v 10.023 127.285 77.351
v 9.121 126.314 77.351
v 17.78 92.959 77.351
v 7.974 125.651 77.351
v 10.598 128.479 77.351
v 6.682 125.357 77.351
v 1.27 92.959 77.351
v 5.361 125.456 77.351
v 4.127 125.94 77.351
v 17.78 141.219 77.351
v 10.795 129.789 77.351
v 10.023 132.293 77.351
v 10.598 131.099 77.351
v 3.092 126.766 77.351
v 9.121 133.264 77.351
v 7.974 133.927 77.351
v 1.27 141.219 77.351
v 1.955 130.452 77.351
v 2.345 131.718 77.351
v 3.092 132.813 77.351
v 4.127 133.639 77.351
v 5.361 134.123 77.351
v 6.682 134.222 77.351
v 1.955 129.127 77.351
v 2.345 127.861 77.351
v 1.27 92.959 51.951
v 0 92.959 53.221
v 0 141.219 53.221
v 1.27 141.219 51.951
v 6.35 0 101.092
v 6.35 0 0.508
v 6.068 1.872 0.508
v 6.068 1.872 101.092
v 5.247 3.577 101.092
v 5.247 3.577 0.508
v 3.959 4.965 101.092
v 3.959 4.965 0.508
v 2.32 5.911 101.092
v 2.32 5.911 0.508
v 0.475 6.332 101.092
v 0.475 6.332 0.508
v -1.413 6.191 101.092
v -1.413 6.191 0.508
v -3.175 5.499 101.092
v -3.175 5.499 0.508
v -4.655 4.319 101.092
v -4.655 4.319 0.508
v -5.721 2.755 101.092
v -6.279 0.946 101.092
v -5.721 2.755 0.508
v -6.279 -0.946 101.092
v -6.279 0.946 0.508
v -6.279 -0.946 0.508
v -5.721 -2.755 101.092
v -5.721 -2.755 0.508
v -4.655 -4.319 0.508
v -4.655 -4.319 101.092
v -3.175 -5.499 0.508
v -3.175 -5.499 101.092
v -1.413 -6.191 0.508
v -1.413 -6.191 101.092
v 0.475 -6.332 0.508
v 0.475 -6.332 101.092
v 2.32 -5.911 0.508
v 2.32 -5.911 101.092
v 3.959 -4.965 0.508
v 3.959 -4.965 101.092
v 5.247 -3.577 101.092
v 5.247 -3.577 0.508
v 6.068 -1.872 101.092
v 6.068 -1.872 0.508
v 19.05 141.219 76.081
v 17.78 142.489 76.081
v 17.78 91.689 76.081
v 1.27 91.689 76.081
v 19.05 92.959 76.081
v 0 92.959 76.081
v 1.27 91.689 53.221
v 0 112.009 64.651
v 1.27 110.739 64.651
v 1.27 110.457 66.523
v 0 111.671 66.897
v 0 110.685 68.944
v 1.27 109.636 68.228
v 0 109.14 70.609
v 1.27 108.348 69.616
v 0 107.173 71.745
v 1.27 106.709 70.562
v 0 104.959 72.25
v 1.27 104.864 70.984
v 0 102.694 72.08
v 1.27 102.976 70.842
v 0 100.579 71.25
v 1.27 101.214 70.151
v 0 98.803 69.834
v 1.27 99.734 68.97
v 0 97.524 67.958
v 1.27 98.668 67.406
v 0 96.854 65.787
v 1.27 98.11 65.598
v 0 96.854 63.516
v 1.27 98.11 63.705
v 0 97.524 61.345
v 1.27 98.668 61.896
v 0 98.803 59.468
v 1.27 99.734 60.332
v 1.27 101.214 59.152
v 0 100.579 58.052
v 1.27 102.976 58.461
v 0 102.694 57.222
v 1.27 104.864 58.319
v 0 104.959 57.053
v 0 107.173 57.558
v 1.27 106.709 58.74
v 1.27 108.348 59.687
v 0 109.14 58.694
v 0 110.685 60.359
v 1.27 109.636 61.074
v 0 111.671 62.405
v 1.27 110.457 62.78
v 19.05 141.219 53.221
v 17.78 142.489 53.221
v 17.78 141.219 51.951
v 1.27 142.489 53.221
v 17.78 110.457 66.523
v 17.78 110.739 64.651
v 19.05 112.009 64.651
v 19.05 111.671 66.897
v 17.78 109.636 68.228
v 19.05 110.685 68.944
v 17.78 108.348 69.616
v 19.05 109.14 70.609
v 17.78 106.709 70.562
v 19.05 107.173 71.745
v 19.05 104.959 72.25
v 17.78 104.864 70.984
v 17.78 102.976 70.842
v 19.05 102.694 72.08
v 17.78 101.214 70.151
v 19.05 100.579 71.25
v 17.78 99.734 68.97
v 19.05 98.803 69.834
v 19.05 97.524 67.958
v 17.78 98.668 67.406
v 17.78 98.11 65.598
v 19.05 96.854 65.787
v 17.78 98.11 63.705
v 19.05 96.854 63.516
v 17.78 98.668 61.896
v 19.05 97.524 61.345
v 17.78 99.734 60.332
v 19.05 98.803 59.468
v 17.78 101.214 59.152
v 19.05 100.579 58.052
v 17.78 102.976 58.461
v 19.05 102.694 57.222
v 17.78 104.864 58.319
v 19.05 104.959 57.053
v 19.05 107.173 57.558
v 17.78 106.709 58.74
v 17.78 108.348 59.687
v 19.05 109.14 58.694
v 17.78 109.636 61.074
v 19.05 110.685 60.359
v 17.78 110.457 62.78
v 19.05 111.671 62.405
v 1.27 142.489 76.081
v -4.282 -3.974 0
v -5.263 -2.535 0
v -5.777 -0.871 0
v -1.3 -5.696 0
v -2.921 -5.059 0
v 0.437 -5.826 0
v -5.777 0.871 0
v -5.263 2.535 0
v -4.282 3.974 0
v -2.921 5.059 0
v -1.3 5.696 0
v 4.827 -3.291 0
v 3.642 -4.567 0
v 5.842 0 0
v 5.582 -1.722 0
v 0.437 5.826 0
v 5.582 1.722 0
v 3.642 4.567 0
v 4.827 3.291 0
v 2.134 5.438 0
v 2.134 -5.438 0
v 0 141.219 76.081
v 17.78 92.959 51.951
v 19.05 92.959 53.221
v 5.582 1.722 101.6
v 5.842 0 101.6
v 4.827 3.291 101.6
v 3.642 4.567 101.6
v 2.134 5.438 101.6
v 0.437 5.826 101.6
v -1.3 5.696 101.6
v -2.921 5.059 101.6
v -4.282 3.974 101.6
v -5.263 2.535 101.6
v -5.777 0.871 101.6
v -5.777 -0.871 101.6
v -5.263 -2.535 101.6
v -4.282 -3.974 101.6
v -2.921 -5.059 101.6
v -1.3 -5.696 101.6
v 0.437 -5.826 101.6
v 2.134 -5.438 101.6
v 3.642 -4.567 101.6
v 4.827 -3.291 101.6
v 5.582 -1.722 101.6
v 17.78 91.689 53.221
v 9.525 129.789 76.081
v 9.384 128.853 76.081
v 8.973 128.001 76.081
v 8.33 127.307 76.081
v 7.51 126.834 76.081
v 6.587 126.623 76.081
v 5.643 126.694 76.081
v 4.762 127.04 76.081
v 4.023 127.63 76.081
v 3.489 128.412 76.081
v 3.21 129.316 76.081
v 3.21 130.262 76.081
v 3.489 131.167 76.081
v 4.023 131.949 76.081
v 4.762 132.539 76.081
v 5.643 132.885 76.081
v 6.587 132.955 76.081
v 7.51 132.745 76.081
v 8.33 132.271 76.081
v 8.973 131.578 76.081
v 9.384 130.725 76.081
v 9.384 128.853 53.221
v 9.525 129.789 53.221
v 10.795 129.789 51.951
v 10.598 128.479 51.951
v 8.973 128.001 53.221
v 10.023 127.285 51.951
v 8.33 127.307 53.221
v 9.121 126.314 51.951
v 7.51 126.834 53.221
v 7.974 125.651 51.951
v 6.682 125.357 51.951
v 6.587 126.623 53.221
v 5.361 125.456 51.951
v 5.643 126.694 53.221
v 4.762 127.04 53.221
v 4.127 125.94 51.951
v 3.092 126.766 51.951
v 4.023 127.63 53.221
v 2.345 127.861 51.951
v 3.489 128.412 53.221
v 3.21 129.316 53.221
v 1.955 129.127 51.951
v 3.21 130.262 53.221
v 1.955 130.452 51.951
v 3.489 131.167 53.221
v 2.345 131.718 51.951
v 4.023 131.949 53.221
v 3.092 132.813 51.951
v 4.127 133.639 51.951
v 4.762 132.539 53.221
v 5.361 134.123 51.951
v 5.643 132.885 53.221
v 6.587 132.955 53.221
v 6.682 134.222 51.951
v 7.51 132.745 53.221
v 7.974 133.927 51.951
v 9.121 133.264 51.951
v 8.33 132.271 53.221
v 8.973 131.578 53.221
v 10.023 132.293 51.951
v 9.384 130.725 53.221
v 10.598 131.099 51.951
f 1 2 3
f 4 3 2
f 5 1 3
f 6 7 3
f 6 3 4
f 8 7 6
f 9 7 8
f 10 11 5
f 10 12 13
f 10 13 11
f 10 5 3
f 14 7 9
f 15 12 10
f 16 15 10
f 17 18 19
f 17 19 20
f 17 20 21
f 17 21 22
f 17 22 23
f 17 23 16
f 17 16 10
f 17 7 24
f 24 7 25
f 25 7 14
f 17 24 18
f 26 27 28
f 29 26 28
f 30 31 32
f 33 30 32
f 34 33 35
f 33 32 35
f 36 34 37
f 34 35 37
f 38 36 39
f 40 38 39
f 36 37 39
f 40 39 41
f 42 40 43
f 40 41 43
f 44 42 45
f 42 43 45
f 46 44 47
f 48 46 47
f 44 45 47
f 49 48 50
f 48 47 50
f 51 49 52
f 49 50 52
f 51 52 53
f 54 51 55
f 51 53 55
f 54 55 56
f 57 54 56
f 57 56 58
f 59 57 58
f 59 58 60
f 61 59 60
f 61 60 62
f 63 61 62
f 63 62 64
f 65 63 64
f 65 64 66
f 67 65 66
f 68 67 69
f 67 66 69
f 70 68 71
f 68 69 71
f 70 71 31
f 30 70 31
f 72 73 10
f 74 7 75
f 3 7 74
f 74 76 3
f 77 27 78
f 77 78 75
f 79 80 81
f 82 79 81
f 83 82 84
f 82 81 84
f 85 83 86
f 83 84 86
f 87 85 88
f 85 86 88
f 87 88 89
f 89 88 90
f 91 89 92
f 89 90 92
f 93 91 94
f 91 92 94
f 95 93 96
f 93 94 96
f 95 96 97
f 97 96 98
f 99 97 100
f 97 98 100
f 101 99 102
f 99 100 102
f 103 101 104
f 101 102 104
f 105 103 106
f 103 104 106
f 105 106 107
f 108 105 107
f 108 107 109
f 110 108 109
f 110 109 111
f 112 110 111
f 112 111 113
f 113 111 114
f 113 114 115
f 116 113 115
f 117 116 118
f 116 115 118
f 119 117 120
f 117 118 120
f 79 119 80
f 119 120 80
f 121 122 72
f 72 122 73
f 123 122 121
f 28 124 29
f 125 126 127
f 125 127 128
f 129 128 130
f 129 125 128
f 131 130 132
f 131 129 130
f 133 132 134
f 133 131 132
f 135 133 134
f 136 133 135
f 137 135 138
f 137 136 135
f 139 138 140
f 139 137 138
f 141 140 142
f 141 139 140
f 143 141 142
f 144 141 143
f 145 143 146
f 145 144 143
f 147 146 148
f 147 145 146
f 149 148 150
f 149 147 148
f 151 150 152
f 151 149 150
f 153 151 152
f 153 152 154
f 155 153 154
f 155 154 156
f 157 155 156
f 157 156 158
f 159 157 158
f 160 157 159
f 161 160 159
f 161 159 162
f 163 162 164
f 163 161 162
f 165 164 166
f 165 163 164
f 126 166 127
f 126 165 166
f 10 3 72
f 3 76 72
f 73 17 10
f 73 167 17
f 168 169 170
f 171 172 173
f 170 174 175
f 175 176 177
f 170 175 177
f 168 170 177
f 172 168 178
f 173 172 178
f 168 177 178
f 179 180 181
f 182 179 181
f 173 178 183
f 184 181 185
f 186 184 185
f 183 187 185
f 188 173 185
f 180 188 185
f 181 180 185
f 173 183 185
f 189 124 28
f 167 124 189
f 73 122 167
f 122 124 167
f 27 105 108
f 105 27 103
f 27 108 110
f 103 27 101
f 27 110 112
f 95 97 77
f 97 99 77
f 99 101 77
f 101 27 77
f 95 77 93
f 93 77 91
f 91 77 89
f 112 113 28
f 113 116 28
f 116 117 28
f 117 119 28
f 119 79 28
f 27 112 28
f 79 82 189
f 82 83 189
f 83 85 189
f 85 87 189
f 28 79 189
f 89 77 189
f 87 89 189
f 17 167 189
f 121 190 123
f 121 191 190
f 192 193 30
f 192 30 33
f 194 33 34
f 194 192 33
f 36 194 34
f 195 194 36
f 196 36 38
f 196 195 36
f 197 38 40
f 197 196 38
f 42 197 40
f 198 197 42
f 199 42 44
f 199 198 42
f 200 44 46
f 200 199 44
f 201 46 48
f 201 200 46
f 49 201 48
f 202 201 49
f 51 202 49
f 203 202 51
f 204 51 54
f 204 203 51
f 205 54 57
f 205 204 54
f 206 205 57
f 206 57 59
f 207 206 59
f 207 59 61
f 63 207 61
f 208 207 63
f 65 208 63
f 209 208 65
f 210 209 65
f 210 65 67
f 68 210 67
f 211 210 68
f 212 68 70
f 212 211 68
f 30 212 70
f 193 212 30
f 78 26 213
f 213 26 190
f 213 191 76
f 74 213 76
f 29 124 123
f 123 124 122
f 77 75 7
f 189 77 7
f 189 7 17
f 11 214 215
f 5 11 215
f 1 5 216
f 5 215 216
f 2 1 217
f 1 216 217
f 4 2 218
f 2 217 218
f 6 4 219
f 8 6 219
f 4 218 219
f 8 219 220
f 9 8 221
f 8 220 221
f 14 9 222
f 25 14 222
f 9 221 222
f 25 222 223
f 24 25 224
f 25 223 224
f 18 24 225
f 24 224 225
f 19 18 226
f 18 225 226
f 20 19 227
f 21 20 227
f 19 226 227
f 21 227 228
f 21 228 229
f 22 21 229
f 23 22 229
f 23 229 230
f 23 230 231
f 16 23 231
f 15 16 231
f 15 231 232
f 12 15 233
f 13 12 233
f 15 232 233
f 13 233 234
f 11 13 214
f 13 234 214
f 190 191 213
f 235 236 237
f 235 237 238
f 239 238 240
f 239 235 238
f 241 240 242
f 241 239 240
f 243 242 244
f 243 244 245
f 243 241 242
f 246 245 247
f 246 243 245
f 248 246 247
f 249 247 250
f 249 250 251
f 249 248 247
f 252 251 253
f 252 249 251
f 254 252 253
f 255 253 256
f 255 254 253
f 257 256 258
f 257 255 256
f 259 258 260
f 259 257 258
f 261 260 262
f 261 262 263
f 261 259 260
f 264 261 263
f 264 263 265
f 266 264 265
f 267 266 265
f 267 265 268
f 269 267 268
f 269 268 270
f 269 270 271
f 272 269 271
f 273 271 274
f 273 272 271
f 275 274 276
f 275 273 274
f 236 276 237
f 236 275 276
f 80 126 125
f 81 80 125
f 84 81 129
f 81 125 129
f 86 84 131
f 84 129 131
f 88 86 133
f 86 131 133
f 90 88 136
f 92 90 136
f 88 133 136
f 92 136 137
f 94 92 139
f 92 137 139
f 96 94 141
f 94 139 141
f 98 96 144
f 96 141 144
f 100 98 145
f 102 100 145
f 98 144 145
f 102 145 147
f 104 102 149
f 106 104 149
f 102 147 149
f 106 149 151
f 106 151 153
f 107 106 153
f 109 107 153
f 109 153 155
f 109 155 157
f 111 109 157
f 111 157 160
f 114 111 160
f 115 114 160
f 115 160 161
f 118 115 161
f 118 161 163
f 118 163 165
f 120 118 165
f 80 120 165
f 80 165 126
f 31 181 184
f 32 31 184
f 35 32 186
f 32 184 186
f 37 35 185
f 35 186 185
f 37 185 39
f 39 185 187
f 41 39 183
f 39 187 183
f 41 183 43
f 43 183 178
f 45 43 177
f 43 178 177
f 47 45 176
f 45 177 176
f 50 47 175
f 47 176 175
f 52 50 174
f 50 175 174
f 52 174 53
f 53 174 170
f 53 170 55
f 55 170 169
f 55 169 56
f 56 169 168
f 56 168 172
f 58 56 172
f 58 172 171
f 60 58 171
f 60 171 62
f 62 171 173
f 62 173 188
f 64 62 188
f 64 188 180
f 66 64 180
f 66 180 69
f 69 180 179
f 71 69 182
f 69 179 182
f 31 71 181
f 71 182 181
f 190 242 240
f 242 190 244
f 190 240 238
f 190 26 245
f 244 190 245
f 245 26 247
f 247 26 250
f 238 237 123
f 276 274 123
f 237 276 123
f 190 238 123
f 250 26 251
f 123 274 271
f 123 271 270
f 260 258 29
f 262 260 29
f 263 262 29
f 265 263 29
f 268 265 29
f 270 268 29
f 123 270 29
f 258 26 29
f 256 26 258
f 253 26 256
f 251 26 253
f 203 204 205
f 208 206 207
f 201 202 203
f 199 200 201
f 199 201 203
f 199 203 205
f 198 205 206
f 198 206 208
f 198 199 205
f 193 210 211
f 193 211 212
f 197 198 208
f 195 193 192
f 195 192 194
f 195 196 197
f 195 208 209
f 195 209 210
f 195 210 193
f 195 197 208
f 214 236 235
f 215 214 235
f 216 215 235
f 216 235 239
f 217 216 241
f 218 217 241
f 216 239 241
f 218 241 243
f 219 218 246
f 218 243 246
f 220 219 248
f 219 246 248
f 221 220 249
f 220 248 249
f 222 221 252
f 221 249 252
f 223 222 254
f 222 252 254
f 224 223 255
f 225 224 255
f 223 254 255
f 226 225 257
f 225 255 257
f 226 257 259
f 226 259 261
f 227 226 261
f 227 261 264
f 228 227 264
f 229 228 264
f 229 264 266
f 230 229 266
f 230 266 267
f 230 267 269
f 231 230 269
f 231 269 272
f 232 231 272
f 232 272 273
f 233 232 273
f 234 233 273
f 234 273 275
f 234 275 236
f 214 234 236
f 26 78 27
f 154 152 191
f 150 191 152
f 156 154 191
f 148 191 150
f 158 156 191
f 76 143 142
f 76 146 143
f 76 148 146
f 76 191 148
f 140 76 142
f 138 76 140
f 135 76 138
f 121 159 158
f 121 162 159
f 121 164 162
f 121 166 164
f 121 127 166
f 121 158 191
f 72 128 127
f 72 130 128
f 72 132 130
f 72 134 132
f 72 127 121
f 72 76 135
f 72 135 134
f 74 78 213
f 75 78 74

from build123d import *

# Parameters (mm, degrees)
F0_R     = 6.35
F1_DEPTH = 101.6
F2_SIZE  = 0.508
F3_W     = 50.8
F3_H     = 25.4
F4_DEPTH = 19.05
F5_R     = 6.35
F6_DEPTH = 25.4
F7_SIZE  = 1.27
F8_R     = 3.175
F9_DEPTH = 38.1
F10_SIZE = 1.27


with BuildPart() as f1:
    # F0 (on Top) → F1 (new body)
    with BuildSketch(Plane.XY):
        Circle(F0_R)
    extrude(amount=F1_DEPTH)

    # F2
    f2_edges = [f1.edges().sort_by_distance(p)[0] for p in [
        (-6.35, 0, 101.6),
        (-6.35, 0, 0),
    ]]
    chamfer(f2_edges, length=F2_SIZE)


with BuildPart() as f4:
    # F3 (on Right) → F4 (new body)
    with BuildSketch(Plane.YZ):
        with Locations((117.089135, 64.651334)):
            Rectangle(F3_W, F3_H)
    extrude(amount=F4_DEPTH)

    # F5 (on face) → F6 (cut)
    with BuildSketch(Plane.YZ.offset(19.05)):
        with Locations((104.389135, 64.651334)):
            Circle(F5_R)
    extrude(amount=-F6_DEPTH, mode=Mode.SUBTRACT)

    # F7
    f7_edges = [f4.edges().sort_by_distance(p)[0] for p in [
        (19.05, 142.489135, 64.651334),
        (9.525, 142.489135, 77.351334),
        (9.525, 142.489135, 51.951334),
        (0, 142.489135, 64.651334),
        (19.05, 117.089135, 51.951334),
        (19.05, 117.089135, 77.351334),
        (19.05, 91.689135, 64.651334),
        (9.525, 91.689135, 77.351334),
        (9.525, 91.689135, 51.951334),
        (0, 91.689135, 64.651334),
        (0, 117.089135, 77.351334),
        (0, 117.089135, 51.951334),
        (0, 98.039135, 64.651334),
        (19.05, 98.039135, 64.651334),
    ]]
    chamfer(f7_edges, length=F7_SIZE)

    # F8 (on face) → F9 (cut)
    with BuildSketch(Plane(origin=(0, 0, 51.951334), x_dir=(1, 0, 0), z_dir=(0, 0, -1))):
        with Locations((6.35, -129.789135)):
            Circle(F8_R)
    extrude(amount=-F9_DEPTH, mode=Mode.SUBTRACT)

    # F10
    f10_edges = [f4.edges().sort_by_distance(p)[0] for p in [
        (3.175, 129.789135, 51.951334),
        (3.175, 129.789135, 77.351334),
    ]]
    chamfer(f10_edges, length=F10_SIZE)


solid = Compound([f1.part, f4.part])
